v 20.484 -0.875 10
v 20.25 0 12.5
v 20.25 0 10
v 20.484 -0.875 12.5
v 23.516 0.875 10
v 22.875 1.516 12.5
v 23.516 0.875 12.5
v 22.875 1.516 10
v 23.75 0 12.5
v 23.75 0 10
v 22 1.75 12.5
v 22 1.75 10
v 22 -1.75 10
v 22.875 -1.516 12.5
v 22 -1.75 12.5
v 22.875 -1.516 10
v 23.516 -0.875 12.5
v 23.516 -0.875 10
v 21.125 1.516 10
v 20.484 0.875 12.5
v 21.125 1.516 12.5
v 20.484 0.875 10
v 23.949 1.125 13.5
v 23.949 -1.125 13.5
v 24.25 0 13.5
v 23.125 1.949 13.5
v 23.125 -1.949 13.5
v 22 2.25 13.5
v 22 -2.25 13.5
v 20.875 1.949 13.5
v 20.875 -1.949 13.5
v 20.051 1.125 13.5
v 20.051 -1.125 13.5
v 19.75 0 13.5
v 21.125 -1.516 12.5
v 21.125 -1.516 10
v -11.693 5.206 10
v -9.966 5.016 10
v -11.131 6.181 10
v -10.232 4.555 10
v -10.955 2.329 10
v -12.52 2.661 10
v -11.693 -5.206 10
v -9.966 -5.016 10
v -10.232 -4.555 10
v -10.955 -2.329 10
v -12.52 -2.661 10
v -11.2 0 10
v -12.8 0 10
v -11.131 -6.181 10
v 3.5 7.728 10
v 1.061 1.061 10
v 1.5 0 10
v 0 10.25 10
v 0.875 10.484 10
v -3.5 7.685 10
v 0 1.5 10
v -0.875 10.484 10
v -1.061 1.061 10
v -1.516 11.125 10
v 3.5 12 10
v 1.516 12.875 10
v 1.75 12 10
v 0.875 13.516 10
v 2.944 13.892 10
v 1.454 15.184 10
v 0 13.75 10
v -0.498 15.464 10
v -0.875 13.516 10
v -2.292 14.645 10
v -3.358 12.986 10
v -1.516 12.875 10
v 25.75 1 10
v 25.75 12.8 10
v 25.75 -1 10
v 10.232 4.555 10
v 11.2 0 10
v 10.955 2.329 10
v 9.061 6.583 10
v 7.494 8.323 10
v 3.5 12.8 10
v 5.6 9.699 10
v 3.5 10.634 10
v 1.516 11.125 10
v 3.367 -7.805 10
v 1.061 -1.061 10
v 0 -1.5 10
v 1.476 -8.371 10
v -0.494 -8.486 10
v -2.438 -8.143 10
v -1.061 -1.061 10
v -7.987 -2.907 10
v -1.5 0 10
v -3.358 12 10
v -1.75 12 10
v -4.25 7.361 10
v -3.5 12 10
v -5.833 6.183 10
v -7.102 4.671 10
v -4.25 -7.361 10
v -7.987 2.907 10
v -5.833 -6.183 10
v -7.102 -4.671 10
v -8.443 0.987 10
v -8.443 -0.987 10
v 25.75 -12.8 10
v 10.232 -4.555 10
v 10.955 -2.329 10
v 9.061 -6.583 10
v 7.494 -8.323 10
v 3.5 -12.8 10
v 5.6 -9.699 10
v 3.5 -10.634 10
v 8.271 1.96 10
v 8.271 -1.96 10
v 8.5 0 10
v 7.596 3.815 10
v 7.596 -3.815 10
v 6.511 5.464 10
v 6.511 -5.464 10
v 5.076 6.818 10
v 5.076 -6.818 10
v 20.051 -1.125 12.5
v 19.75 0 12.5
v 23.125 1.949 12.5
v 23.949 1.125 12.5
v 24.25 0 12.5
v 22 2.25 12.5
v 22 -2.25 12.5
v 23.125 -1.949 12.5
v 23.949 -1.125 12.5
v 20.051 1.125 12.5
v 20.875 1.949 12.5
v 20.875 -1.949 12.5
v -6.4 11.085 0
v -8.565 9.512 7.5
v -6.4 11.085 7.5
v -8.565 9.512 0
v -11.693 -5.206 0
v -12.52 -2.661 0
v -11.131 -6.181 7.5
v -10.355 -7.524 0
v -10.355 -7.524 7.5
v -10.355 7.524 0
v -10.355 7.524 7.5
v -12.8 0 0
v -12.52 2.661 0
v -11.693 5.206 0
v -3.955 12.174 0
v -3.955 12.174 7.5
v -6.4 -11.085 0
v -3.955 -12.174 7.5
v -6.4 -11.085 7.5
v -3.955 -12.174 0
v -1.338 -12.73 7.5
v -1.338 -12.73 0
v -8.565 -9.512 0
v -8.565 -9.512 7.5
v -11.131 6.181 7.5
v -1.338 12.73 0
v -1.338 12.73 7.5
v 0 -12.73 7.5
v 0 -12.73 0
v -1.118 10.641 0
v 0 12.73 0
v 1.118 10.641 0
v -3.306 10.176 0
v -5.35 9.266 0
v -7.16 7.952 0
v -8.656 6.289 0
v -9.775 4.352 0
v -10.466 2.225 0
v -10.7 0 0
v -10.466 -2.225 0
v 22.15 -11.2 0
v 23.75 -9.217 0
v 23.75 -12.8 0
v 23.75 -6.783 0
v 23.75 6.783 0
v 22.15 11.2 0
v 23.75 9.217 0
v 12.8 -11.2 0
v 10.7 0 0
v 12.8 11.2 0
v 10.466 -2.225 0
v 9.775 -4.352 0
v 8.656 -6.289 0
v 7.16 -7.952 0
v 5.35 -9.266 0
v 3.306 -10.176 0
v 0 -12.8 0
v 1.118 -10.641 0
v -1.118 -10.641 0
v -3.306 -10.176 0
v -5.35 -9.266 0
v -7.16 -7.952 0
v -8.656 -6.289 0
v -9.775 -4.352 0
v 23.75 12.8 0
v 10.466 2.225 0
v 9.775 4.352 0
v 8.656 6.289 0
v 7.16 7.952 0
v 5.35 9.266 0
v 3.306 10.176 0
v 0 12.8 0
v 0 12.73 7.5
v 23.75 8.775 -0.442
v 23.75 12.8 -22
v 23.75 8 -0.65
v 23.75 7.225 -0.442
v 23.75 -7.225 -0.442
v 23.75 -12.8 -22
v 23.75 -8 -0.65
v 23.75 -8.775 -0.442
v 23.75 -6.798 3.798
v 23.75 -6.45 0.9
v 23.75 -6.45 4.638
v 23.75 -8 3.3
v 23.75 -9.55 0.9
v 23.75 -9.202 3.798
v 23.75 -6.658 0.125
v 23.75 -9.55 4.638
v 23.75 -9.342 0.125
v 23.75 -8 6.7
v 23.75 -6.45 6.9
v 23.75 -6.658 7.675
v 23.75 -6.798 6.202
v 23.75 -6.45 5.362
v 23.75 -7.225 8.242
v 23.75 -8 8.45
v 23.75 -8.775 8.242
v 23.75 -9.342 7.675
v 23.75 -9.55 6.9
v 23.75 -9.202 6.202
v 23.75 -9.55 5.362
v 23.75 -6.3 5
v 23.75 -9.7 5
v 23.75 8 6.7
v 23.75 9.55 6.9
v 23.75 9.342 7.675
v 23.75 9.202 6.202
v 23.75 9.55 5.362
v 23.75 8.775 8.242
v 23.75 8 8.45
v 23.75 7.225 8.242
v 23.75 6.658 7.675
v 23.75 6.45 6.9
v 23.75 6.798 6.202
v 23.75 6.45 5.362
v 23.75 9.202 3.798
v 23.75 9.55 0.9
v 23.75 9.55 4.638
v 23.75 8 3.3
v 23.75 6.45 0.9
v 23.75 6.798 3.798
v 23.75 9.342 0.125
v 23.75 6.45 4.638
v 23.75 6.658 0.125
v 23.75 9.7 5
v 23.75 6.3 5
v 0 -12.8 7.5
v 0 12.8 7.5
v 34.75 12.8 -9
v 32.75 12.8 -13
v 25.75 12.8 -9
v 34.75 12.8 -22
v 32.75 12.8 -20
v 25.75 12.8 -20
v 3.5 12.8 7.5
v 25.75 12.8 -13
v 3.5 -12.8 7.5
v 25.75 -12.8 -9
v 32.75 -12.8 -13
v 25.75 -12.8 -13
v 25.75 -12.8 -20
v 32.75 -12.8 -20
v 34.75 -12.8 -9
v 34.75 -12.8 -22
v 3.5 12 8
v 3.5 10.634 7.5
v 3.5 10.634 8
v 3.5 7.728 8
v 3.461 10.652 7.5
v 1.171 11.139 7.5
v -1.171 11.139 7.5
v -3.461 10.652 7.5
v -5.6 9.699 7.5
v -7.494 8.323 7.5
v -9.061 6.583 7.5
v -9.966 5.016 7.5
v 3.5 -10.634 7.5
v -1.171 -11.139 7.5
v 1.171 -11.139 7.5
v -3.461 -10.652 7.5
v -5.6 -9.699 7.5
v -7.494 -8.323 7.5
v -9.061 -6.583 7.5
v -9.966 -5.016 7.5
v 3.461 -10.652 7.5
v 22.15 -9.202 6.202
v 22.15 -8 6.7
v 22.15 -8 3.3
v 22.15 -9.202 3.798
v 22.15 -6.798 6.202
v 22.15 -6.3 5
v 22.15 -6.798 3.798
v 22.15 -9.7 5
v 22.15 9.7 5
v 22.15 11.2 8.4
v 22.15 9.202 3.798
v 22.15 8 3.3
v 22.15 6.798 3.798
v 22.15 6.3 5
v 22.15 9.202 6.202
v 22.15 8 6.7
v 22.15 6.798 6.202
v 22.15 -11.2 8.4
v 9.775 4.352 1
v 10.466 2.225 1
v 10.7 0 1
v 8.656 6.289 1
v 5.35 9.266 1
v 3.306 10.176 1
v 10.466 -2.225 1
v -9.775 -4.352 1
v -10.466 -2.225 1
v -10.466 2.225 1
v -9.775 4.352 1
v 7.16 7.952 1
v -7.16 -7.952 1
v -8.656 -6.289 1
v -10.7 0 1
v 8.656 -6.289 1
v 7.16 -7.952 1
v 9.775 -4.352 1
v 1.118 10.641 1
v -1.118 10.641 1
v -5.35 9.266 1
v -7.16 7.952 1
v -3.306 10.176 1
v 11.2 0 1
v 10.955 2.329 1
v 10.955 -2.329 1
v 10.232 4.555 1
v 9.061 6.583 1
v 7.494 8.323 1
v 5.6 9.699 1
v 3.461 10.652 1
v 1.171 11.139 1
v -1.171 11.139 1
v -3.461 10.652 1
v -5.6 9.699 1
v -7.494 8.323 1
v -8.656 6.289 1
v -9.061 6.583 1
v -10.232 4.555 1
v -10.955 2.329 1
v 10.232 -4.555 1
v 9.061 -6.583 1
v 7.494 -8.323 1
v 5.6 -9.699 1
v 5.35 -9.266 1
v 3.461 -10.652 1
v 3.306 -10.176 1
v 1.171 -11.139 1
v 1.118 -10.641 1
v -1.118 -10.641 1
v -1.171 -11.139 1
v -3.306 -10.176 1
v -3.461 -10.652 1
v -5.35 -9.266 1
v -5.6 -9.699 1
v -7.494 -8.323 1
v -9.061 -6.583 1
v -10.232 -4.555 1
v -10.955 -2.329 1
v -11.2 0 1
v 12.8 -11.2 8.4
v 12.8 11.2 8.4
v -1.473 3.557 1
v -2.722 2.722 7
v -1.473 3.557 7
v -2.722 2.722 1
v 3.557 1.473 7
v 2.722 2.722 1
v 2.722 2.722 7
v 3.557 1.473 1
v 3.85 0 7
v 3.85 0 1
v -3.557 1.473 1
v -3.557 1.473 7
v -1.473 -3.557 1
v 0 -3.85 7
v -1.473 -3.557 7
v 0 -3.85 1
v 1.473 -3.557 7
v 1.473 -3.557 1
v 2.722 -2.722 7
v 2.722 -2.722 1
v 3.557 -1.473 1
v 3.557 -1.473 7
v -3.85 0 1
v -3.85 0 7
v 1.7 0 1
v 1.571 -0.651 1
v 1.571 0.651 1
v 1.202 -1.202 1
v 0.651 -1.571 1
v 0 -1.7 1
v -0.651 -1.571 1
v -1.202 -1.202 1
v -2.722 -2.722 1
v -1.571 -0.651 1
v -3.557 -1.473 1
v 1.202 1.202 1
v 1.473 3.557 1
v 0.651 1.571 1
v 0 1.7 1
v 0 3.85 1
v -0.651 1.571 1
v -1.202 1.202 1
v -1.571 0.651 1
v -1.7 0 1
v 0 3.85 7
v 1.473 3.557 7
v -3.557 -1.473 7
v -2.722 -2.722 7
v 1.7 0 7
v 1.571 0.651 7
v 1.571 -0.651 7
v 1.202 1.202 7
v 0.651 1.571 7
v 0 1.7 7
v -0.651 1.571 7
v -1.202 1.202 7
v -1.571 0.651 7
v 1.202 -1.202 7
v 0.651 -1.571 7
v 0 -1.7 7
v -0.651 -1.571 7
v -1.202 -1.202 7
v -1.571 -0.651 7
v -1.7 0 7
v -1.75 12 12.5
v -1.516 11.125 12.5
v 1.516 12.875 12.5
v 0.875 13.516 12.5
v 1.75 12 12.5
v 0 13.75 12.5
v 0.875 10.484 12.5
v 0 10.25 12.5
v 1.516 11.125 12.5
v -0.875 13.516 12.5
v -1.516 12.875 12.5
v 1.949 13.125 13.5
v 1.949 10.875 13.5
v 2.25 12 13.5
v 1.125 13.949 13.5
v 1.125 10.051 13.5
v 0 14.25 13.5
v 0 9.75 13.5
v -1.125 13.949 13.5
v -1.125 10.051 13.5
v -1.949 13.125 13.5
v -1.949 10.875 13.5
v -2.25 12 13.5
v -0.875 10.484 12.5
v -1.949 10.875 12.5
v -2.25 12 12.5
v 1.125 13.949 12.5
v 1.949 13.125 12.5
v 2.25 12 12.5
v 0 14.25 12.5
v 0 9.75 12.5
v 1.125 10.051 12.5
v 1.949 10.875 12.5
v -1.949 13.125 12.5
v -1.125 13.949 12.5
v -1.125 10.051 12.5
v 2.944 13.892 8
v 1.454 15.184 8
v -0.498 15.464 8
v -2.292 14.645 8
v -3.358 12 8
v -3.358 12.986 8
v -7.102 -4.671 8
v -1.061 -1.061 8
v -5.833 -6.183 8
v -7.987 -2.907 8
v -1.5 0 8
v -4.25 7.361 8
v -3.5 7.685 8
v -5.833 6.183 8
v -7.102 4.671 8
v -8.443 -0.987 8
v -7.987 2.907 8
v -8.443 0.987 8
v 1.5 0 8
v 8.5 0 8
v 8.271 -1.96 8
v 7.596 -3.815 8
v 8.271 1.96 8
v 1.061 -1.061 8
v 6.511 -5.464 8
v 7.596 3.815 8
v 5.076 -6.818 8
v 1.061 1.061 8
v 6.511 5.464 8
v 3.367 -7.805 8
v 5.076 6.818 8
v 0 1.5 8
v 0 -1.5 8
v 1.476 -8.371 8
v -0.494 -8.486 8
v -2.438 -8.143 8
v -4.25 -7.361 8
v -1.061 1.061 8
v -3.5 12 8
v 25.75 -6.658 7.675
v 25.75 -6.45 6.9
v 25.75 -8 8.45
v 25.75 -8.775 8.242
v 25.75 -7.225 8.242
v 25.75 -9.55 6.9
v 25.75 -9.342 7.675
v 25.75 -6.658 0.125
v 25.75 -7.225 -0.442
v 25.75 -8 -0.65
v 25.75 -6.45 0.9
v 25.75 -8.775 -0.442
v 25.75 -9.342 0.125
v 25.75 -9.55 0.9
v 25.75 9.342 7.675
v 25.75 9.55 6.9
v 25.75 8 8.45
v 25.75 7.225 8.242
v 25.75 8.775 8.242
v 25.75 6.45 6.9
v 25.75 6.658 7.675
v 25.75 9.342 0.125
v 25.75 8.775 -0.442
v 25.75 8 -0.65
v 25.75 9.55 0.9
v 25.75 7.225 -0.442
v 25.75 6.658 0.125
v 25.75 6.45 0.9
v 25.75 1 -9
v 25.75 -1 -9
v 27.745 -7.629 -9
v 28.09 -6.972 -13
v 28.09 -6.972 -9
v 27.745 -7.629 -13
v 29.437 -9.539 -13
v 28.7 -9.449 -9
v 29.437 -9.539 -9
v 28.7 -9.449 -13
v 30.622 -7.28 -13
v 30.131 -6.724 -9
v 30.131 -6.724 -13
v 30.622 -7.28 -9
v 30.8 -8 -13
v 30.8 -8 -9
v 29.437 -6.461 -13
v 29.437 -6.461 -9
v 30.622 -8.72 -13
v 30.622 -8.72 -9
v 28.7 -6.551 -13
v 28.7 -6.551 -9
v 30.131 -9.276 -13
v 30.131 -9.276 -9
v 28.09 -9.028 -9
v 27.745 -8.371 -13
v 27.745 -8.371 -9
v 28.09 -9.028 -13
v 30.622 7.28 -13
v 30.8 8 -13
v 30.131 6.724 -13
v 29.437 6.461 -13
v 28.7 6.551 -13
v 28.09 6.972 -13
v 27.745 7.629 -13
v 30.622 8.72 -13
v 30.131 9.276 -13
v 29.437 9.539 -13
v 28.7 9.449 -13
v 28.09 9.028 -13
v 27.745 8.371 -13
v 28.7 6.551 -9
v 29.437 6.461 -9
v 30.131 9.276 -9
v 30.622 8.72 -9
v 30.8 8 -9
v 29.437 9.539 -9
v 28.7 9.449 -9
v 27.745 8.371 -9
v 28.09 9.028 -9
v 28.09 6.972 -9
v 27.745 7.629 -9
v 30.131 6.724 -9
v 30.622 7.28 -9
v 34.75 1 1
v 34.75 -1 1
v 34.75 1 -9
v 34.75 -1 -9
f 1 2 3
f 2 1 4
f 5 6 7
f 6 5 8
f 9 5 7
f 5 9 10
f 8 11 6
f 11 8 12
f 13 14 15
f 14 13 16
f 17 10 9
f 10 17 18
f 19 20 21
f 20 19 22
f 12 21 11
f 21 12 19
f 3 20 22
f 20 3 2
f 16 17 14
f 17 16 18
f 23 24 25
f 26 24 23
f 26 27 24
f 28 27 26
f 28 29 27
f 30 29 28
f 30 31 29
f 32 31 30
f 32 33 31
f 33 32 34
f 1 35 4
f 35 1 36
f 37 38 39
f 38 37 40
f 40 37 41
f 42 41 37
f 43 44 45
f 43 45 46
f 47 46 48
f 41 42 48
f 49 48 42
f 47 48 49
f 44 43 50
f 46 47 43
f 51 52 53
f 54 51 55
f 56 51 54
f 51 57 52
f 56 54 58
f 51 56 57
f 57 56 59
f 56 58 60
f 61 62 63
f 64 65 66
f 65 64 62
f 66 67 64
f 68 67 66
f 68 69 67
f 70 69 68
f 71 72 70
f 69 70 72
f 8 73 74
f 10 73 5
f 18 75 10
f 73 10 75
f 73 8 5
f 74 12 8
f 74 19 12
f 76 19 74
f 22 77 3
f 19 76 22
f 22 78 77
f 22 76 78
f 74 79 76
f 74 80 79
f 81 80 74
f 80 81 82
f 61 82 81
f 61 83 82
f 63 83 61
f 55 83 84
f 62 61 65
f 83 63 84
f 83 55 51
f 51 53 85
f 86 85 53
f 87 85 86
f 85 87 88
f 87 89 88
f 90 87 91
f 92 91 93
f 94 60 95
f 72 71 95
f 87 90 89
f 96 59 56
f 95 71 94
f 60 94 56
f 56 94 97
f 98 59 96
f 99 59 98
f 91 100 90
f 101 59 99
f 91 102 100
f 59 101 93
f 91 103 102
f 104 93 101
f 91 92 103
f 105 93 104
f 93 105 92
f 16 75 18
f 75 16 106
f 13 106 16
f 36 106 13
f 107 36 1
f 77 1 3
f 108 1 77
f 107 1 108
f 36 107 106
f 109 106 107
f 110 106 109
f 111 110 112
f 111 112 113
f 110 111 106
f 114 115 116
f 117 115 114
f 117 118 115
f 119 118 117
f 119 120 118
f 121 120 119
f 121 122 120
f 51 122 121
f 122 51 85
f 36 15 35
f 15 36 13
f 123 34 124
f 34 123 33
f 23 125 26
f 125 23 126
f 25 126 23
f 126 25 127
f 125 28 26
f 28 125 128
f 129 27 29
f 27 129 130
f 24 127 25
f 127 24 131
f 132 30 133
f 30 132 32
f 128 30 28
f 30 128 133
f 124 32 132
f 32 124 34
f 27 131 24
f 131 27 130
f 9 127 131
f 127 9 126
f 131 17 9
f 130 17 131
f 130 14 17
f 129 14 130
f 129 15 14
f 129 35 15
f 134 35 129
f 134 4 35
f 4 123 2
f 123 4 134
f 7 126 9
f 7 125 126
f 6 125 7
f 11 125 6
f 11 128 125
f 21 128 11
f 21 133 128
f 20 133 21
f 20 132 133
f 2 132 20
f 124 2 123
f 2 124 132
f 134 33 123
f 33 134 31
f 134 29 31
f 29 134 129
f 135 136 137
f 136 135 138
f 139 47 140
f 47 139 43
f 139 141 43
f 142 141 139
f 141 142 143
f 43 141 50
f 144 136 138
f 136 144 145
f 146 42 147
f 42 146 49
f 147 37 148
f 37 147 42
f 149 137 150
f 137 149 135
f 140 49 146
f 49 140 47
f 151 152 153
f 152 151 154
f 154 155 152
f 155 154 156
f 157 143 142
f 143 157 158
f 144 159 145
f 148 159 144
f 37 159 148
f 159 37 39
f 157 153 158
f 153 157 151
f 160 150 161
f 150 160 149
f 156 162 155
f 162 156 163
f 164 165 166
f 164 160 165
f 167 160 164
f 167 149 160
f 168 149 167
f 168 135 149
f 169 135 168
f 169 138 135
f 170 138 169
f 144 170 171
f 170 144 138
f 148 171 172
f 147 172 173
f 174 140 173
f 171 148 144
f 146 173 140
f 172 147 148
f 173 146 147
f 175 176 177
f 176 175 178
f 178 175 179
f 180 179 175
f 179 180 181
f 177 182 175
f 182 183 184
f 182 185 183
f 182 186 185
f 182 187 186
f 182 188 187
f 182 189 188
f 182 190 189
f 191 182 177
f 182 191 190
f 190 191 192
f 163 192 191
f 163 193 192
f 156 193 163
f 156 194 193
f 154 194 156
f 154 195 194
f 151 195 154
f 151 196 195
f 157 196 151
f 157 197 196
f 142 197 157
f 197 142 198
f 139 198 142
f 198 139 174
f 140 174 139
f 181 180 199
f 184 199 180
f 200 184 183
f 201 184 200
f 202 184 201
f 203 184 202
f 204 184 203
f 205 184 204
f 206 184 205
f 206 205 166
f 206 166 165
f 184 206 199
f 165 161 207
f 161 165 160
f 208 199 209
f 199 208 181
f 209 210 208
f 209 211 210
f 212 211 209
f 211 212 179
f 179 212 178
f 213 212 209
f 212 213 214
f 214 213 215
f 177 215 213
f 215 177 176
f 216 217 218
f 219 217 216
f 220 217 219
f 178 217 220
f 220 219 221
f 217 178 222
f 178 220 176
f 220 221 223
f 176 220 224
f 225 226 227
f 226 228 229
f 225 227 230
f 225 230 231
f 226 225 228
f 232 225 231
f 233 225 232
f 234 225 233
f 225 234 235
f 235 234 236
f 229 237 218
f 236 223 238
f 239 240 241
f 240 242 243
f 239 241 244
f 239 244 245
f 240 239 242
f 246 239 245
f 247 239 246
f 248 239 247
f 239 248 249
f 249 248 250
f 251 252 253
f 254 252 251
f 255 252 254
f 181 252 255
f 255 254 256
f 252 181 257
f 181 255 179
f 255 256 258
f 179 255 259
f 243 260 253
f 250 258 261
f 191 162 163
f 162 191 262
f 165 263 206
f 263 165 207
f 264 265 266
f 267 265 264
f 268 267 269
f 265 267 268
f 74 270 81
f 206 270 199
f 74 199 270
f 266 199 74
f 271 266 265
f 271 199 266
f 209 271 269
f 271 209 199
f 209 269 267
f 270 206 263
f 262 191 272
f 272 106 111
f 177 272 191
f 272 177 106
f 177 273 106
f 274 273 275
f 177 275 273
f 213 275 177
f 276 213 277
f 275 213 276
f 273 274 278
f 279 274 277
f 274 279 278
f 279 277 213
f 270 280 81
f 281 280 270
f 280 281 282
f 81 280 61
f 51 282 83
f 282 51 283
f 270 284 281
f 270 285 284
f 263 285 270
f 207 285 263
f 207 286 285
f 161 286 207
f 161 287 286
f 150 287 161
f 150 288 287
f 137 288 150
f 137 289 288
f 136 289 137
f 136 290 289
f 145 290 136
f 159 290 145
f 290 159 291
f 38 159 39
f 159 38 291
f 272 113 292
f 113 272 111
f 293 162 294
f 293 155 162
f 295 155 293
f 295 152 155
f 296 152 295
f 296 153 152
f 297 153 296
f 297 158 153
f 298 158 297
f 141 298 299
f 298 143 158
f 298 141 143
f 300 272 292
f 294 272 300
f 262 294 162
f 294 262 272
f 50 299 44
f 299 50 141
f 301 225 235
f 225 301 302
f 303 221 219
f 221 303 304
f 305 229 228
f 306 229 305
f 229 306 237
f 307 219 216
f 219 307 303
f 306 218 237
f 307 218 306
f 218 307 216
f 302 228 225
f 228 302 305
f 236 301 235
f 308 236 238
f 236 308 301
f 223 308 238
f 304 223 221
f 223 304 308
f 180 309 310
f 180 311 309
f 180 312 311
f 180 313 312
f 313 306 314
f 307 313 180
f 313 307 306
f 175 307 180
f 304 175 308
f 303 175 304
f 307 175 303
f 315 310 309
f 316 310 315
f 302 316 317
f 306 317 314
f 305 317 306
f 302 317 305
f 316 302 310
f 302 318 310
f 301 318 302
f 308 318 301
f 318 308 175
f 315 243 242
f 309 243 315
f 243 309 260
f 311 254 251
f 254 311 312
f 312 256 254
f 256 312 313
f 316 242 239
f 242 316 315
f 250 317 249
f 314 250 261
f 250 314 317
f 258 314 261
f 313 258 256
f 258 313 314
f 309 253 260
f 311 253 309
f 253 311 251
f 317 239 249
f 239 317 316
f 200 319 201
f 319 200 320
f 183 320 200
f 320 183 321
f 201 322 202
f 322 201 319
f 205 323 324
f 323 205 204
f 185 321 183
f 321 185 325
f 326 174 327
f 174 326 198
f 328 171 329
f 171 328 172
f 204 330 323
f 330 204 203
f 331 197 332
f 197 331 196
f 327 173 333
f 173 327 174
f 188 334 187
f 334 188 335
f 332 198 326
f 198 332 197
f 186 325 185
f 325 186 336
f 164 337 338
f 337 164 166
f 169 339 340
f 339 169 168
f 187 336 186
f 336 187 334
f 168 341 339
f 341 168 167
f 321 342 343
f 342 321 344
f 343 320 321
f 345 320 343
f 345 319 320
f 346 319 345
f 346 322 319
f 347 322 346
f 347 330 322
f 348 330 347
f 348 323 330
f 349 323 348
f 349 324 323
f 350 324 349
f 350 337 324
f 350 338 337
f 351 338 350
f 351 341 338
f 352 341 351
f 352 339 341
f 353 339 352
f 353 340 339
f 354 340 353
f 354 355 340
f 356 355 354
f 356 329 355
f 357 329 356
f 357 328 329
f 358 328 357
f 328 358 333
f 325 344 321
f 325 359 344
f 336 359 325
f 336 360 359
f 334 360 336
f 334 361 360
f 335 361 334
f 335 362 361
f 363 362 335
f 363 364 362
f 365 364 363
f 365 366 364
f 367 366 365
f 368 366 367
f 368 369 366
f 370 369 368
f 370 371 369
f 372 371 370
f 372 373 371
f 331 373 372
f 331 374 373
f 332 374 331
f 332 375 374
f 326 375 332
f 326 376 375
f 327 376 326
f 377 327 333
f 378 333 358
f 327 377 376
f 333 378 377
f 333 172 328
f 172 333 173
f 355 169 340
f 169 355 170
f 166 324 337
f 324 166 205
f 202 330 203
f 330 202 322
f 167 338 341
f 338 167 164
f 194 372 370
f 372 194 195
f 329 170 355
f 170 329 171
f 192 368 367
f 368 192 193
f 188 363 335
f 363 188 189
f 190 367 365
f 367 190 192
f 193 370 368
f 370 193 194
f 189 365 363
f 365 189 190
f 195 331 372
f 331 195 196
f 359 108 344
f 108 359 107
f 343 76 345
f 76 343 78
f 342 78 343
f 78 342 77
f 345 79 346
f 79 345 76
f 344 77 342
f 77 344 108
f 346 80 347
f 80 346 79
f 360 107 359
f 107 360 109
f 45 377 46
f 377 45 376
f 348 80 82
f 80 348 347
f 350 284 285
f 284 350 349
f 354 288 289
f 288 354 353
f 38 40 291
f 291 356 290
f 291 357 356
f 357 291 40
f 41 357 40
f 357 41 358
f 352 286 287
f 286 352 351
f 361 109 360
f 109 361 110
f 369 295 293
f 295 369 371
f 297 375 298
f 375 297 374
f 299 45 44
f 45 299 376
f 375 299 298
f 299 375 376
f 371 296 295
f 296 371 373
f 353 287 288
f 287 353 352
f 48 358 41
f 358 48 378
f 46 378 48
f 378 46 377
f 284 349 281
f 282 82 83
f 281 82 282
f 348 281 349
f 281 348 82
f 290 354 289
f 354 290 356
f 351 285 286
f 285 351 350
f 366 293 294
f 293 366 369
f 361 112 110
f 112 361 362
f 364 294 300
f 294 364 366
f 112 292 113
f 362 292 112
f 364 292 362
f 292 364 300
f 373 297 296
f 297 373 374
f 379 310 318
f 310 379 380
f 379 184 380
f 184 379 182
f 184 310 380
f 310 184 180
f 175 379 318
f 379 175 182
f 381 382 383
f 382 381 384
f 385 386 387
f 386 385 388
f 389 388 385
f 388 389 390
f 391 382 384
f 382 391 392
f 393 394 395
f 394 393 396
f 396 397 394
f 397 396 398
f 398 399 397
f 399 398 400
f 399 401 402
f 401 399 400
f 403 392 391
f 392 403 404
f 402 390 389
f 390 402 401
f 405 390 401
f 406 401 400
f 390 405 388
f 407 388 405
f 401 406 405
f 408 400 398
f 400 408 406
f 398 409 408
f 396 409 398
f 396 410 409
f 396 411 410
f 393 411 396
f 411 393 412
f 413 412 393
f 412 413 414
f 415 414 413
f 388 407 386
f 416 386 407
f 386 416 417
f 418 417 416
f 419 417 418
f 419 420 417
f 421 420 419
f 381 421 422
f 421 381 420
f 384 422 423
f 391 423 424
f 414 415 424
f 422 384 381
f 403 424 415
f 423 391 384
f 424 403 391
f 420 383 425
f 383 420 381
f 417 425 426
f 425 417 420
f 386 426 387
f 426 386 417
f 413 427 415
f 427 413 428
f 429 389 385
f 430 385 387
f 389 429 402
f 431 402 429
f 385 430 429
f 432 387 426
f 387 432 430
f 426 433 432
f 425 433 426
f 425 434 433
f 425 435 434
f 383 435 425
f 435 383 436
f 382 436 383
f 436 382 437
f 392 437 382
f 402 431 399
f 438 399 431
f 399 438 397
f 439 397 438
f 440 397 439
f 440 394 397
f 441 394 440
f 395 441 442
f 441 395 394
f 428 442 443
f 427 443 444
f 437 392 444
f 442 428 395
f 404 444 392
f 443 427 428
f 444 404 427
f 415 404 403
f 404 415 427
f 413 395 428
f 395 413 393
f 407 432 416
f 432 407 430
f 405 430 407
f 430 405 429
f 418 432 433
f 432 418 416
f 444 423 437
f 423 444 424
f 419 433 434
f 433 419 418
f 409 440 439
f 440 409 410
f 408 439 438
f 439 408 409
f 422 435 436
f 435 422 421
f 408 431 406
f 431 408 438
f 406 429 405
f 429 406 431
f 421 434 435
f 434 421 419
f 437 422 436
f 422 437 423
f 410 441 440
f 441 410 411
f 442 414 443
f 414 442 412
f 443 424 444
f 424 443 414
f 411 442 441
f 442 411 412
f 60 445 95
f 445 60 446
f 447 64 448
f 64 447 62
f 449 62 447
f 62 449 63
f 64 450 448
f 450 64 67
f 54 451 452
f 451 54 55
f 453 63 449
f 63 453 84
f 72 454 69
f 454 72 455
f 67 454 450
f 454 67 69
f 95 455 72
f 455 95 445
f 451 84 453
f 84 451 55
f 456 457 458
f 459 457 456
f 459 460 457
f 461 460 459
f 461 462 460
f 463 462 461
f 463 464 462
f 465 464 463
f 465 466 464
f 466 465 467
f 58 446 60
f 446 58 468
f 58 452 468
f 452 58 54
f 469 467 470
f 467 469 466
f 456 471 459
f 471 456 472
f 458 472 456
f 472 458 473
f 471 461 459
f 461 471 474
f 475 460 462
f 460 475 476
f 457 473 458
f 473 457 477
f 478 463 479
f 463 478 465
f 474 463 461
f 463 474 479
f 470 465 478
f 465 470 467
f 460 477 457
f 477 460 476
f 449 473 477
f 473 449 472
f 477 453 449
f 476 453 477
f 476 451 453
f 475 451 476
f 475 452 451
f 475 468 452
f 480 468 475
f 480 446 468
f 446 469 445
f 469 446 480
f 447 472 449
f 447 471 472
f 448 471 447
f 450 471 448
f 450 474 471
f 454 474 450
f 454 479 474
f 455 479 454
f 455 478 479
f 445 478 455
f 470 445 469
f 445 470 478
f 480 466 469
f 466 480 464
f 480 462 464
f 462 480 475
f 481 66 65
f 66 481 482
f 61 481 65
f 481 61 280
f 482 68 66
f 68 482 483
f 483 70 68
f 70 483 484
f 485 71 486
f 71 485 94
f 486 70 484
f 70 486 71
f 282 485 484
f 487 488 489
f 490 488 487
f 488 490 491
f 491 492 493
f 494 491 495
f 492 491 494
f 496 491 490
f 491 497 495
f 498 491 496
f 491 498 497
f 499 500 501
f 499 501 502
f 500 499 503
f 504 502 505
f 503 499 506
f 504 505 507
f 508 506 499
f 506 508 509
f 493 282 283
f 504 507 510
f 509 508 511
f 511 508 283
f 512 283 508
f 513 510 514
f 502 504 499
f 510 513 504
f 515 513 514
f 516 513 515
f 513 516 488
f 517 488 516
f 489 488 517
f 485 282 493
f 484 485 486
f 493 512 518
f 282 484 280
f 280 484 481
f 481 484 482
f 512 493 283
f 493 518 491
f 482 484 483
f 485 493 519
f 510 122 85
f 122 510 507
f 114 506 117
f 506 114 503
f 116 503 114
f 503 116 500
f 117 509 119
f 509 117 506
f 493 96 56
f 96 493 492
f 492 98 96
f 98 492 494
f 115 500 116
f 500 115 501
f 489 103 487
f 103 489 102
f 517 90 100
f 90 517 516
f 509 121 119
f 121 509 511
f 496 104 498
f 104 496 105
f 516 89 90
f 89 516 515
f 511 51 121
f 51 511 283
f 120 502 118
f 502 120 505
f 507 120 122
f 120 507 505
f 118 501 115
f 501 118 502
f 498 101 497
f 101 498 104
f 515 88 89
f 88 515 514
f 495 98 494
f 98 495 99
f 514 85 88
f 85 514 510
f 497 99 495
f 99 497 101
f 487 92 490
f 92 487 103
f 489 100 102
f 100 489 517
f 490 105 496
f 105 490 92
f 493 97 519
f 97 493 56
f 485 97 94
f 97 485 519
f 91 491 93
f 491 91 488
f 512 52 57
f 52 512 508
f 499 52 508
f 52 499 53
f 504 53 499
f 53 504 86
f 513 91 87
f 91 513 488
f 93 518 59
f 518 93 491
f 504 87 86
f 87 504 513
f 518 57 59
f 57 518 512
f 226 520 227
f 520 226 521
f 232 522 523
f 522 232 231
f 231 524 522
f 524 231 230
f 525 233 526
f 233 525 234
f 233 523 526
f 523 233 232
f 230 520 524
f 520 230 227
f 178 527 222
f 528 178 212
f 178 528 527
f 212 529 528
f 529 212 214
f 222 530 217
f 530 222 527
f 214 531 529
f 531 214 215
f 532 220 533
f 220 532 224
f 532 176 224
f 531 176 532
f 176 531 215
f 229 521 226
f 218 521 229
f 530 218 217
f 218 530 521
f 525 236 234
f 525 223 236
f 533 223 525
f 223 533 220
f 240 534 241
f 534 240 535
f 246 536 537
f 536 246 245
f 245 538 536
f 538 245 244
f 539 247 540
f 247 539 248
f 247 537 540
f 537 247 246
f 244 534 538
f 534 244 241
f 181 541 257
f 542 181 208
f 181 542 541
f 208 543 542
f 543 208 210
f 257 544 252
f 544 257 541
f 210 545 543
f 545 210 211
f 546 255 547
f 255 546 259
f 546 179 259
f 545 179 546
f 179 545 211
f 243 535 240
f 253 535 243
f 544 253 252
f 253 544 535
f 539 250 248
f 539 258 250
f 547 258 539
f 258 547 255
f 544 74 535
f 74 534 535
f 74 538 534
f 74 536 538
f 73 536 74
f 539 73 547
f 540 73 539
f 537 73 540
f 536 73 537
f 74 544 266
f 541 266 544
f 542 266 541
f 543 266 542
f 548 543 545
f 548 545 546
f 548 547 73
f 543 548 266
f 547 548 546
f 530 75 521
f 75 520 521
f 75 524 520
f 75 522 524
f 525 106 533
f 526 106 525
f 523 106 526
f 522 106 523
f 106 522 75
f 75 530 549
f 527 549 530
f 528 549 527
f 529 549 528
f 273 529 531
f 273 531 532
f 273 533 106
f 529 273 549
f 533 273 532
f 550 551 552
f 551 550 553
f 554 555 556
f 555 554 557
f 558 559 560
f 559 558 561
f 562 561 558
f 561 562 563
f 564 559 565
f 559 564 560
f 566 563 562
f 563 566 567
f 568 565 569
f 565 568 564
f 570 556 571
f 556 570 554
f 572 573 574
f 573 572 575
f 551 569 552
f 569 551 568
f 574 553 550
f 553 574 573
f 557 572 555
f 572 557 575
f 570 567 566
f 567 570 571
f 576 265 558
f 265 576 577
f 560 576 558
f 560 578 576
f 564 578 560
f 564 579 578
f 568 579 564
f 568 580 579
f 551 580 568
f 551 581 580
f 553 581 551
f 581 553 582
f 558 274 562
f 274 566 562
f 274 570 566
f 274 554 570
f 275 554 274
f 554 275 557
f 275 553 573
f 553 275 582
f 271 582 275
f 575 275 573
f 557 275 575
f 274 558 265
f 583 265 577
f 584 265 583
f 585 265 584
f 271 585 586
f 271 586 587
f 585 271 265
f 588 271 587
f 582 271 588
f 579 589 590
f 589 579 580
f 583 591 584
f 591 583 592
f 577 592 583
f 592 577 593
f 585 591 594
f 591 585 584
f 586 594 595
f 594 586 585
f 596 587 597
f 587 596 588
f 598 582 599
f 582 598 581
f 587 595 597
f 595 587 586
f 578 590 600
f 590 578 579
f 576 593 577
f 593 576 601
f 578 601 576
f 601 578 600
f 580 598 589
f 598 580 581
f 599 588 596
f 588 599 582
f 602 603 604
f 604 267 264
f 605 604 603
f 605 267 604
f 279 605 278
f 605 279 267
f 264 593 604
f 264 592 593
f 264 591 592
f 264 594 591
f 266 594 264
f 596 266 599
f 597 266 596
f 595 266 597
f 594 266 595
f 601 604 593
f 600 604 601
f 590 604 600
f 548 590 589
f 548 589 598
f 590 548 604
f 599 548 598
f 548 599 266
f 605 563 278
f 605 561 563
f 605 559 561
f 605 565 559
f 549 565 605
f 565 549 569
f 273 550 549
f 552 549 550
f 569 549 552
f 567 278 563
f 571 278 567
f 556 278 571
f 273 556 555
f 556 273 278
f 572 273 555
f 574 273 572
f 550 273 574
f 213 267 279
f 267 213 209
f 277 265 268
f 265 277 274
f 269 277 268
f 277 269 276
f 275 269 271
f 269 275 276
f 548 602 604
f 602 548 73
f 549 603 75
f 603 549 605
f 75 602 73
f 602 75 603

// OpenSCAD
// Bearing dimensions
bearingDiam = 22.4;
bearingInnerDiam = 7.7;
bearingHeight = 7;

thickness = 1.6;
rimHeight = 1;
rimThickness = 0.5;
stopHeight = 2;
armLength = 30;

// Spring fasteners
fastener1Distance = 12; // distance from the axis
fastener2Distance = 22; // distance from the axis
fastenerDiam = 3.5;
fastenerHeigh = 3.5;

// support holes
holeSep = 16;
holeDiam = 3.4;

armWidth = 2*fastenerDiam;
outerDiam = bearingDiam + 2*thickness;
height = bearingHeight + rimHeight + stopHeight;
// Distance from the axis to the support wall
wallDist = fastener2Distance + fastenerDiam/2;
fastenerDistance = sqrt(pow(fastener1Distance, 2) + pow(fastener2Distance, 2));
echo("Distance between the spring fasteners:", fastenerDistance);
echo("Distance from the axis to the wall:", wallDist);

//$fn = 80;

module limitCutout() {
    h = bearingHeight + rimHeight;
    union() {
        for (angle = [0, 30, 45]) {
            rotate(angle) translate([0, bearingDiam/2, h + stopHeight/2])
                cube([armWidth, bearingDiam, stopHeight+1], center=true);
        }
    }
}

module springFastener() {
    union() {
        cylinder(fastenerHeigh, d=fastenerDiam, $fn=12);
        translate([0, 0, fastenerHeigh-1]) cylinder(1, d=fastenerDiam+1, $fn=12);
    }
}

module crank() {
    difference() {
        union() {
            cylinder(stopHeight, d=17);
            translate([-armWidth/2, 0, 0])
                cube([armWidth, fastener1Distance, stopHeight]);
            translate([0, fastener1Distance, 0]) {
                cylinder(stopHeight, d=armWidth);
                translate([0, 0, stopHeight]) springFastener();
            }
        }
        cylinder(stopHeight, d=3, $fn=8);
    }
}

// bearing holder
module bearingHolder() {
    difference() {
        union() {
            cylinder(height, d=outerDiam);
            translate([0, -outerDiam/2, 0]) cube([wallDist, outerDiam, height]);
            translate([fastener2Distance, 0, height]) springFastener();
        }

        // rim at the bottom of the bearing
        cylinder(rimHeight, d=bearingDiam - 2*rimThickness);
        translate([0, 0, rimHeight]) cylinder(height, d=bearingDiam);

        // limit cutouts
        limitCutout();
        mirror([0, 1, 0]) limitCutout();

        // hollow bottom rectangle
        hollowL = outerDiam - 2*thickness;
        hollowW = wallDist - bearingDiam/2 - 2*thickness;
        translate([bearingDiam/2 + thickness, -hollowL/2, 0])
            cube([hollowW, hollowL, height-thickness]);

        // support holes
        for (y = [-holeSep/2, holeSep/2]) {
            translate([wallDist - thickness, y, height/2]) rotate([0, 90, 0])
                cylinder(thickness, d=holeDiam, $fn=8);
        }
    };
}

module elongatedHole(d, l, h) {
    union() {
        translate([-l/2, -d/2, 0]) cube([l, d, h]);
        for (pos = [-1, 1]) {
            translate([pos*l/2, 0, 0]) cylinder(h, d=d, $fn=12);
        }
    }
}

flangeLen = 21;

module rodAdapter() {
    rodSize = 7.0;
    thickerSide = 4;
    width = outerDiam;
    holeLen = 6;
    d = 3.1;
    th = 2;

    holeSize = [rodSize, width+.2, rodSize];
    holePos = flangeLen - holeLen/2 - d;
    clampSize = [rodSize + 2*th, width, rodSize + th + thickerSide];
    dist = flangeLen - d - holeLen/2 + thickerSide + rodSize/2;
    echo("Distance from elongated hole's center to rod's center", dist);

    difference() {
        union() {
            // flange
            difference() {
                translate([0, -width/2, 0]) cube([th, width, flangeLen]);
                // elongated holes
                for (i = [-1, 1]) {
                    translate([-.1, i*holeSep/2, holePos]) rotate([0, 90, 0])
                        elongatedHole(d, holeLen, th+.2);
                }
            }
            // rod clamp
            translate([0, 0, th - clampSize[2]])
                difference() {
                    translate([0, -width/2, 0]) cube(clampSize);
                    translate([th, -width/2-.1, th]) cube(holeSize);
                    // clamp holes
                    for (i = [-1, 1]) {
                        translate([th+rodSize/2, i*holeSep/2, th+rodSize])
                            cylinder(thickerSide+.1, d=d, $fn=13);
                    }
                }
            // rib
            difference() {
                translate([th, -th/2, 0]) cube([clampSize[0]-th, th, flangeLen]);
                translate([th, -flangeLen/2, flangeLen]) rotate([0, 45, 0]) cube(flangeLen);
            }
        }
    }
}

module bearingAdapter() {
    h = bearingHeight - 1;
    $fn = 16;
    difference() {
        cylinder(h, d=bearingInnerDiam);
        cylinder(h, d=holeDiam);
    }
}


part = 0;

if (part == 1) {
    bearingAdapter();
} else if (part == 2) {
    bearingHolder();
} else if (part == 3) {
    crank();
} else if (part == 4) {
    rodAdapter();
} else {
    // assembly
    bearingHolder();
    translate([0, 0, rimHeight]) bearingAdapter();
    translate([0, 0, bearingHeight + rimHeight]) crank();
    translate([wallDist, 0, height-flangeLen]) rodAdapter();
}
